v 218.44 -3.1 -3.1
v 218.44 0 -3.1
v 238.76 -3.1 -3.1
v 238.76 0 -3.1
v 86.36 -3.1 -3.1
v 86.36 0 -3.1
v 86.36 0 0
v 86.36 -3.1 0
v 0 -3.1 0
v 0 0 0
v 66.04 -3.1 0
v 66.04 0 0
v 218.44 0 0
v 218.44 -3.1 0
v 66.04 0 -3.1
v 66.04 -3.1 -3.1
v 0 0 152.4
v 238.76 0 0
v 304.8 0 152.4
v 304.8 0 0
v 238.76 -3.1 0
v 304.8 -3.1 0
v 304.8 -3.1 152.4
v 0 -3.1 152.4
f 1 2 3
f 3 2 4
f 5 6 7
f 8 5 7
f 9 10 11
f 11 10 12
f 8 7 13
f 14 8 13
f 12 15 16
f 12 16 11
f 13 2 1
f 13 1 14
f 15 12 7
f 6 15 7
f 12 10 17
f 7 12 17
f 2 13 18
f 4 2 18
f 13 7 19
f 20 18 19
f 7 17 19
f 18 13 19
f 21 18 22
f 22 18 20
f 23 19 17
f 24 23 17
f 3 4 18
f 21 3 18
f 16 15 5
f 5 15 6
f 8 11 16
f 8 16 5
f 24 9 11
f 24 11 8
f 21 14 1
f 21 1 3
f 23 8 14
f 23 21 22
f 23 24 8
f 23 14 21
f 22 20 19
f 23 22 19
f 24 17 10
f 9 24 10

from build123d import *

# Parameters (mm, degrees)
F0_W     = 20.32
F0_H     = 3.1
F1_DEPTH = 3.1


with BuildPart() as f1:
    # F0 (on Front) → F1 (new body)
    with BuildSketch(Plane.XZ):
        with BuildLine():
            Line((150.0847015591, 26.4639822764), (0, 0))
            Line((0, 0), (66.04, 0))
            Line((66.04, 0), (86.36, 0))
            Line((86.36, 0), (152.4, 0))
            ThreePointArc((152.4, 0), (151.8200719892, 13.2825351947), (150.0847015591, 26.4639822764))
        make_face()
        with BuildLine():
            Line((0, 152.4), (0, 0))
            Line((0, 0), (26.4639822764, 150.0847015591))
            ThreePointArc((26.4639822764, 150.0847015591), (13.2825351947, 151.8200719892), (0, 152.4))
        make_face()
        with BuildLine():
            Line((26.4639822764, 150.0847015591), (0, 0))
            Line((0, 0), (52.1238698428, 143.2091554078))
            ThreePointArc((52.1238698428, 143.2091554078), (39.4440224736, 147.2070959265), (26.4639822764, 150.0847015591))
        make_face()
        with BuildLine():
            Line((52.1238698428, 143.2091554078), (0, 0))
            Line((0, 0), (76.2, 131.9822715367))
            ThreePointArc((76.2, 131.9822715367), (64.4070230893, 138.1213067444), (52.1238698428, 143.2091554078))
        make_face()
        with BuildLine():
            Line((76.2, 131.9822715367), (0, 0))
            Line((0, 0), (97.9608317162, 116.7451731313))
            ThreePointArc((97.9608317162, 116.7451731313), (87.4130488999, 124.8387715496), (76.2, 131.9822715367))
        make_face()
        with BuildLine():
            Line((97.9608317162, 116.7451731313), (0, 0))
            Line((0, 0), (116.7451731313, 97.9608317162))
            ThreePointArc((116.7451731313, 97.9608317162), (107.7630734528, 107.7630734528), (97.9608317162, 116.7451731313))
        make_face()
        with BuildLine():
            Line((116.7451731313, 97.9608317162), (0, 0))
            Line((0, 0), (131.9822715367, 76.2))
            ThreePointArc((131.9822715367, 76.2), (124.8387715496, 87.4130488999), (116.7451731313, 97.9608317162))
        make_face()
        with BuildLine():
            Line((131.9822715367, 76.2), (0, 0))
            Line((0, 0), (143.2091554078, 52.1238698428))
            ThreePointArc((143.2091554078, 52.1238698428), (138.1213067444, 64.4070230893), (131.9822715367, 76.2))
        make_face()
        with BuildLine():
            Line((143.2091554078, 52.1238698428), (0, 0))
            Line((0, 0), (150.0847015591, 26.4639822764))
            ThreePointArc((150.0847015591, 26.4639822764), (147.2070959265, 39.4440224736), (143.2091554078, 52.1238698428))
        make_face()
        with Locations((76.2, -1.55)):
            Rectangle(F0_W, F0_H)
        with BuildLine():
            Line((304.8, 152.4), (0, 152.4))
            ThreePointArc((0, 152.4), (13.2825351947, 151.8200719892), (26.4639822764, 150.0847015591))
            ThreePointArc((26.4639822764, 150.0847015591), (39.4440224736, 147.2070959265), (52.1238698428, 143.2091554078))
            ThreePointArc((52.1238698428, 143.2091554078), (64.4070230893, 138.1213067444), (76.2, 131.9822715367))
            ThreePointArc((76.2, 131.9822715367), (87.4130488999, 124.8387715496), (97.9608317162, 116.7451731313))
            ThreePointArc((97.9608317162, 116.7451731313), (107.7630734528, 107.7630734528), (116.7451731313, 97.9608317162))
            ThreePointArc((116.7451731313, 97.9608317162), (124.8387715496, 87.4130488999), (131.9822715367, 76.2))
            ThreePointArc((131.9822715367, 76.2), (138.1213067444, 64.4070230893), (143.2091554078, 52.1238698428))
            ThreePointArc((143.2091554078, 52.1238698428), (147.2070959265, 39.4440224736), (150.0847015591, 26.4639822764))
            ThreePointArc((150.0847015591, 26.4639822764), (151.8200719892, 13.2825351947), (152.4, 0))
            Line((152.4, 0), (218.44, 0))
            Line((218.44, 0), (238.76, 0))
            Line((238.76, 0), (301.7, 0))
            Line((301.7, 0), (304.8, 0))
            Line((304.8, 0), (304.8, 25.4))
            Line((304.8, 25.4), (304.8, 152.4))
        make_face()
        with Locations((228.6, -1.55)):
            Rectangle(F0_W, F0_H)
    extrude(amount=F1_DEPTH)


solid = f1.part
